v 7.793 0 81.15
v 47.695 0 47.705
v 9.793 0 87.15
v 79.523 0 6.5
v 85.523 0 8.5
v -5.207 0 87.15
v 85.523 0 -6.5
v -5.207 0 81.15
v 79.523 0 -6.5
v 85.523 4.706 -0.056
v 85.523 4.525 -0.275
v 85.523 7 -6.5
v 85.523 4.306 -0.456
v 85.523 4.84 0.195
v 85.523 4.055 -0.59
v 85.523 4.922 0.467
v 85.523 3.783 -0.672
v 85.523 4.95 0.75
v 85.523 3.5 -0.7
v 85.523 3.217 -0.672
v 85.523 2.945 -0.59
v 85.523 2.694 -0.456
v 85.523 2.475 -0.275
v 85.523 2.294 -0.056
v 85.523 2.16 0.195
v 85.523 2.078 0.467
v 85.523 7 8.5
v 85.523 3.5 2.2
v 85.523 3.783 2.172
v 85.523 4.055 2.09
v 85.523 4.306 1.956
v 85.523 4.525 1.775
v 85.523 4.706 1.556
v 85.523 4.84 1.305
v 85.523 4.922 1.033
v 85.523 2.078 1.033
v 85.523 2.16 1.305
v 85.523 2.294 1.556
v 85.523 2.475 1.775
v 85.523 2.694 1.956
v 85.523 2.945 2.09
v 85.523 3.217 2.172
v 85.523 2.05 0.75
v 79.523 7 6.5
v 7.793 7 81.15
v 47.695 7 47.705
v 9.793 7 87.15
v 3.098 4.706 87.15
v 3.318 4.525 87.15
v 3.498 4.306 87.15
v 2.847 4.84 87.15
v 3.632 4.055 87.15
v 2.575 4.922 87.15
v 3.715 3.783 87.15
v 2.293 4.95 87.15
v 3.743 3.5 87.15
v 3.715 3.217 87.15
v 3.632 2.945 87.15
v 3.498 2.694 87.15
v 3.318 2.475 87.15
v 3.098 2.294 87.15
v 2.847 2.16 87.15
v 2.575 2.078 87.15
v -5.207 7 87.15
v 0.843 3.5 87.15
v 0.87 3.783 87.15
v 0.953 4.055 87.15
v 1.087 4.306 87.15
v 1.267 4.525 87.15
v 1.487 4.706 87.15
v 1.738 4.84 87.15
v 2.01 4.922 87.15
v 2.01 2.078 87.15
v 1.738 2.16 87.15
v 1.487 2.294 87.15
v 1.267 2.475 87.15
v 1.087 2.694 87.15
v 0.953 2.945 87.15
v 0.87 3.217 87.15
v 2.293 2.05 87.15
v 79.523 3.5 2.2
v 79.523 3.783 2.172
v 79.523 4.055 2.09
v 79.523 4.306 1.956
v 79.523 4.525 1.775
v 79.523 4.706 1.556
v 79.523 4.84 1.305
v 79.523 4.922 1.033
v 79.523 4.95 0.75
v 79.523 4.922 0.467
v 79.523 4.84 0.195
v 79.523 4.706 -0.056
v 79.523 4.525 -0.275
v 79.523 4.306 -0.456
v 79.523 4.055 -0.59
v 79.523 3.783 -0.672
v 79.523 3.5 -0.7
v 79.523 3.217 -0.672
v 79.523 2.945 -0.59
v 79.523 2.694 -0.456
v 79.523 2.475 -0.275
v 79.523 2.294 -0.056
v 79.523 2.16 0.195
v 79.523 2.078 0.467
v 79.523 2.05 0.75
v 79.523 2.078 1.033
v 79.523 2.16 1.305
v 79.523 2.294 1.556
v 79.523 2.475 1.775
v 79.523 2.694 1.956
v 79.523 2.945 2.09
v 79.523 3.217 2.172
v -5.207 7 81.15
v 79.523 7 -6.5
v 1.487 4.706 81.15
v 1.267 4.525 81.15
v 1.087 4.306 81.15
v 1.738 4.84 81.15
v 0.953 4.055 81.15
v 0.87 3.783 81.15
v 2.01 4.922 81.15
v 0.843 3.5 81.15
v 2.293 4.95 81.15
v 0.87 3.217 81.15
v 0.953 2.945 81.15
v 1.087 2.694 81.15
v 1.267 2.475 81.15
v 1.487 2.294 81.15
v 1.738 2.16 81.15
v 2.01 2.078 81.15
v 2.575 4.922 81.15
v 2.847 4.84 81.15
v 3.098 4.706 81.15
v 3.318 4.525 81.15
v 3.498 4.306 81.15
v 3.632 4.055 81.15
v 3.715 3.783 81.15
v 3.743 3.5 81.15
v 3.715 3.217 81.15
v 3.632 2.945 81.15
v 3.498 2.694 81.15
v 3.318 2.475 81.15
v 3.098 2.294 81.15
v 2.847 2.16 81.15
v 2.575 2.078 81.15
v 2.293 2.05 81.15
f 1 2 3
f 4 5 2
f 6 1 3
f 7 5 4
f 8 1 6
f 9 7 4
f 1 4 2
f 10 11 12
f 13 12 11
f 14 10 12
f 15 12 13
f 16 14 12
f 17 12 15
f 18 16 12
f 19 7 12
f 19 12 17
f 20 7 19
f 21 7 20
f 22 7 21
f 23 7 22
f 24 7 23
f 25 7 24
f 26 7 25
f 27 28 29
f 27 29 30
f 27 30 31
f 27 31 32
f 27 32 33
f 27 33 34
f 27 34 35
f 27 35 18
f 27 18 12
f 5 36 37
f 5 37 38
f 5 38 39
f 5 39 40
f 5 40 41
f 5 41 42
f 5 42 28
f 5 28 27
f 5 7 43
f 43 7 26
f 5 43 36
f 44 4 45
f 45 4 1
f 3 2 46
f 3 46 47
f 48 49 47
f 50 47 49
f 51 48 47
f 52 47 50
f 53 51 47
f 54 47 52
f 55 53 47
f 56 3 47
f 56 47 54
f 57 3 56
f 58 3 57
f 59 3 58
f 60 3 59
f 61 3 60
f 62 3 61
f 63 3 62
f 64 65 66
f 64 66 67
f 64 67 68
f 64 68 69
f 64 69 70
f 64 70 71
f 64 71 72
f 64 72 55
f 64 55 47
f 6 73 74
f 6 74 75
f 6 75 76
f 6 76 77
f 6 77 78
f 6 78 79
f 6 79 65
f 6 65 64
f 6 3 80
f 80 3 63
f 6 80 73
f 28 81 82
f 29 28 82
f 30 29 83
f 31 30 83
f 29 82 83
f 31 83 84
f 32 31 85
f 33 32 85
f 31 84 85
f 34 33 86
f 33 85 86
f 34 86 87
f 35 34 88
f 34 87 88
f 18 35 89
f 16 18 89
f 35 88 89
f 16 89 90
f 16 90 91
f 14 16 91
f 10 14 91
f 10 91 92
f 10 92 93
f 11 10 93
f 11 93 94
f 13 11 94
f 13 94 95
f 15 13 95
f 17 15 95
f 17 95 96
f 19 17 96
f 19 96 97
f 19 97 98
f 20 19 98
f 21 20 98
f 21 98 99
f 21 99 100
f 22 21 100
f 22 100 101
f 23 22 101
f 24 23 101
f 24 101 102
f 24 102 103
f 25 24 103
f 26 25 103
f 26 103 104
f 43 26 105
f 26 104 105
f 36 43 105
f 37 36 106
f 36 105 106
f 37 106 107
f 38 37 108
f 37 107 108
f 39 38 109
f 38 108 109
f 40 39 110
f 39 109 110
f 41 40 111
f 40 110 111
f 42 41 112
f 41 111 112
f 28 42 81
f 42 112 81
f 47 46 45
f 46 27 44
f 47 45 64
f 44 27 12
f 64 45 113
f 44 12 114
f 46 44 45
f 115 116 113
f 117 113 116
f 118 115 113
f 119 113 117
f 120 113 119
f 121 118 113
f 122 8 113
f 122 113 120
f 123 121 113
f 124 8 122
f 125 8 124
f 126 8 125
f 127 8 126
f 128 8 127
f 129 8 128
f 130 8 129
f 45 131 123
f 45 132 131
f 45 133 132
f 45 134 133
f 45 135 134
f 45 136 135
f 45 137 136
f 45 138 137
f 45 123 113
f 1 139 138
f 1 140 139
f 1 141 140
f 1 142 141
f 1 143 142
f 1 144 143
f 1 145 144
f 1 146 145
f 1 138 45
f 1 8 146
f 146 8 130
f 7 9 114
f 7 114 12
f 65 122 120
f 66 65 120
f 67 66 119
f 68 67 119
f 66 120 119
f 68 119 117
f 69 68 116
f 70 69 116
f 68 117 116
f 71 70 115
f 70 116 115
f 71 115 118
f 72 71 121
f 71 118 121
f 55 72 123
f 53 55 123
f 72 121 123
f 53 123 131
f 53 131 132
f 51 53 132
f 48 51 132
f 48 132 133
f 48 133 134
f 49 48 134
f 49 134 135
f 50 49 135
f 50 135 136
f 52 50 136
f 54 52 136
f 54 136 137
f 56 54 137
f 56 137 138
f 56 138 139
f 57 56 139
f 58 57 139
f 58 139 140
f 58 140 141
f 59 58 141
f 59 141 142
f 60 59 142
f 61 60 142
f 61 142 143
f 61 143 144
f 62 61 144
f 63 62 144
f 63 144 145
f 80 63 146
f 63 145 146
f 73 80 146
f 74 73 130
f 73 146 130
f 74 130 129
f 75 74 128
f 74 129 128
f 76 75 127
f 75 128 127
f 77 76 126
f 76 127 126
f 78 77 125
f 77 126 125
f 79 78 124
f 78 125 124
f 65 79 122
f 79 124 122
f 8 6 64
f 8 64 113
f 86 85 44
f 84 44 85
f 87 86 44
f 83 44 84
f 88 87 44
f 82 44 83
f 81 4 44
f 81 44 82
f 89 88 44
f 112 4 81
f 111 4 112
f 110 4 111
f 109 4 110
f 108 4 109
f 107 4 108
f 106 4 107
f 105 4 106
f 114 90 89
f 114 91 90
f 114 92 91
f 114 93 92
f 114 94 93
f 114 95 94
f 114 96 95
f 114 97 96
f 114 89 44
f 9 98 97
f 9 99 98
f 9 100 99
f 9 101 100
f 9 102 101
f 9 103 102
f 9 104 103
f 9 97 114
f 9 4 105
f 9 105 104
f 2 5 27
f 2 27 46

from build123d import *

# Parameters (mm, degrees)
BOSS_EXTRUDE1_DEPTH = 7
SKETCH14_R          = 1.45
CUT_EXTRUDE1_DEPTH  = 10
SKETCH15_R          = 1.45
CUT_EXTRUDE2_DEPTH  = 10


with BuildPart() as part:
    # Sketch12 → Boss-Extrude1 (new body)
    with BuildSketch(Plane(origin=(0, 0, 0), x_dir=(1, 0, 0), z_dir=(0, 1, 0))):
        Polygon((85.522563955, 6.5), (85.522563955, -8.5), (47.695057641, -47.704563591), (9.792563955, -87.15), (-5.207436045, -87.15), (-5.207436045, -81.15), (7.792563955, -81.15), (43.657563955, -43.825), (79.522563955, -6.5), (79.522563955, 6.5), align=None)
    extrude(amount=BOSS_EXTRUDE1_DEPTH)

    # Sketch14 → Cut-Extrude1 (cut)
    with BuildSketch(Plane(origin=(0, 0, 81.15), x_dir=(-1, 0, 0), z_dir=(0, 0, -1))):
        with Locations((-2.292563955, 3.5)):
            Circle(SKETCH14_R)
    extrude(amount=-CUT_EXTRUDE1_DEPTH, mode=Mode.SUBTRACT)

    # Sketch15 → Cut-Extrude2 (cut)
    with BuildSketch(Plane.ZY.offset(-79.522563955)):
        with Locations((0.75, 3.5)):
            Circle(SKETCH15_R)
    extrude(amount=-CUT_EXTRUDE2_DEPTH, mode=Mode.SUBTRACT)


solid = part.part
